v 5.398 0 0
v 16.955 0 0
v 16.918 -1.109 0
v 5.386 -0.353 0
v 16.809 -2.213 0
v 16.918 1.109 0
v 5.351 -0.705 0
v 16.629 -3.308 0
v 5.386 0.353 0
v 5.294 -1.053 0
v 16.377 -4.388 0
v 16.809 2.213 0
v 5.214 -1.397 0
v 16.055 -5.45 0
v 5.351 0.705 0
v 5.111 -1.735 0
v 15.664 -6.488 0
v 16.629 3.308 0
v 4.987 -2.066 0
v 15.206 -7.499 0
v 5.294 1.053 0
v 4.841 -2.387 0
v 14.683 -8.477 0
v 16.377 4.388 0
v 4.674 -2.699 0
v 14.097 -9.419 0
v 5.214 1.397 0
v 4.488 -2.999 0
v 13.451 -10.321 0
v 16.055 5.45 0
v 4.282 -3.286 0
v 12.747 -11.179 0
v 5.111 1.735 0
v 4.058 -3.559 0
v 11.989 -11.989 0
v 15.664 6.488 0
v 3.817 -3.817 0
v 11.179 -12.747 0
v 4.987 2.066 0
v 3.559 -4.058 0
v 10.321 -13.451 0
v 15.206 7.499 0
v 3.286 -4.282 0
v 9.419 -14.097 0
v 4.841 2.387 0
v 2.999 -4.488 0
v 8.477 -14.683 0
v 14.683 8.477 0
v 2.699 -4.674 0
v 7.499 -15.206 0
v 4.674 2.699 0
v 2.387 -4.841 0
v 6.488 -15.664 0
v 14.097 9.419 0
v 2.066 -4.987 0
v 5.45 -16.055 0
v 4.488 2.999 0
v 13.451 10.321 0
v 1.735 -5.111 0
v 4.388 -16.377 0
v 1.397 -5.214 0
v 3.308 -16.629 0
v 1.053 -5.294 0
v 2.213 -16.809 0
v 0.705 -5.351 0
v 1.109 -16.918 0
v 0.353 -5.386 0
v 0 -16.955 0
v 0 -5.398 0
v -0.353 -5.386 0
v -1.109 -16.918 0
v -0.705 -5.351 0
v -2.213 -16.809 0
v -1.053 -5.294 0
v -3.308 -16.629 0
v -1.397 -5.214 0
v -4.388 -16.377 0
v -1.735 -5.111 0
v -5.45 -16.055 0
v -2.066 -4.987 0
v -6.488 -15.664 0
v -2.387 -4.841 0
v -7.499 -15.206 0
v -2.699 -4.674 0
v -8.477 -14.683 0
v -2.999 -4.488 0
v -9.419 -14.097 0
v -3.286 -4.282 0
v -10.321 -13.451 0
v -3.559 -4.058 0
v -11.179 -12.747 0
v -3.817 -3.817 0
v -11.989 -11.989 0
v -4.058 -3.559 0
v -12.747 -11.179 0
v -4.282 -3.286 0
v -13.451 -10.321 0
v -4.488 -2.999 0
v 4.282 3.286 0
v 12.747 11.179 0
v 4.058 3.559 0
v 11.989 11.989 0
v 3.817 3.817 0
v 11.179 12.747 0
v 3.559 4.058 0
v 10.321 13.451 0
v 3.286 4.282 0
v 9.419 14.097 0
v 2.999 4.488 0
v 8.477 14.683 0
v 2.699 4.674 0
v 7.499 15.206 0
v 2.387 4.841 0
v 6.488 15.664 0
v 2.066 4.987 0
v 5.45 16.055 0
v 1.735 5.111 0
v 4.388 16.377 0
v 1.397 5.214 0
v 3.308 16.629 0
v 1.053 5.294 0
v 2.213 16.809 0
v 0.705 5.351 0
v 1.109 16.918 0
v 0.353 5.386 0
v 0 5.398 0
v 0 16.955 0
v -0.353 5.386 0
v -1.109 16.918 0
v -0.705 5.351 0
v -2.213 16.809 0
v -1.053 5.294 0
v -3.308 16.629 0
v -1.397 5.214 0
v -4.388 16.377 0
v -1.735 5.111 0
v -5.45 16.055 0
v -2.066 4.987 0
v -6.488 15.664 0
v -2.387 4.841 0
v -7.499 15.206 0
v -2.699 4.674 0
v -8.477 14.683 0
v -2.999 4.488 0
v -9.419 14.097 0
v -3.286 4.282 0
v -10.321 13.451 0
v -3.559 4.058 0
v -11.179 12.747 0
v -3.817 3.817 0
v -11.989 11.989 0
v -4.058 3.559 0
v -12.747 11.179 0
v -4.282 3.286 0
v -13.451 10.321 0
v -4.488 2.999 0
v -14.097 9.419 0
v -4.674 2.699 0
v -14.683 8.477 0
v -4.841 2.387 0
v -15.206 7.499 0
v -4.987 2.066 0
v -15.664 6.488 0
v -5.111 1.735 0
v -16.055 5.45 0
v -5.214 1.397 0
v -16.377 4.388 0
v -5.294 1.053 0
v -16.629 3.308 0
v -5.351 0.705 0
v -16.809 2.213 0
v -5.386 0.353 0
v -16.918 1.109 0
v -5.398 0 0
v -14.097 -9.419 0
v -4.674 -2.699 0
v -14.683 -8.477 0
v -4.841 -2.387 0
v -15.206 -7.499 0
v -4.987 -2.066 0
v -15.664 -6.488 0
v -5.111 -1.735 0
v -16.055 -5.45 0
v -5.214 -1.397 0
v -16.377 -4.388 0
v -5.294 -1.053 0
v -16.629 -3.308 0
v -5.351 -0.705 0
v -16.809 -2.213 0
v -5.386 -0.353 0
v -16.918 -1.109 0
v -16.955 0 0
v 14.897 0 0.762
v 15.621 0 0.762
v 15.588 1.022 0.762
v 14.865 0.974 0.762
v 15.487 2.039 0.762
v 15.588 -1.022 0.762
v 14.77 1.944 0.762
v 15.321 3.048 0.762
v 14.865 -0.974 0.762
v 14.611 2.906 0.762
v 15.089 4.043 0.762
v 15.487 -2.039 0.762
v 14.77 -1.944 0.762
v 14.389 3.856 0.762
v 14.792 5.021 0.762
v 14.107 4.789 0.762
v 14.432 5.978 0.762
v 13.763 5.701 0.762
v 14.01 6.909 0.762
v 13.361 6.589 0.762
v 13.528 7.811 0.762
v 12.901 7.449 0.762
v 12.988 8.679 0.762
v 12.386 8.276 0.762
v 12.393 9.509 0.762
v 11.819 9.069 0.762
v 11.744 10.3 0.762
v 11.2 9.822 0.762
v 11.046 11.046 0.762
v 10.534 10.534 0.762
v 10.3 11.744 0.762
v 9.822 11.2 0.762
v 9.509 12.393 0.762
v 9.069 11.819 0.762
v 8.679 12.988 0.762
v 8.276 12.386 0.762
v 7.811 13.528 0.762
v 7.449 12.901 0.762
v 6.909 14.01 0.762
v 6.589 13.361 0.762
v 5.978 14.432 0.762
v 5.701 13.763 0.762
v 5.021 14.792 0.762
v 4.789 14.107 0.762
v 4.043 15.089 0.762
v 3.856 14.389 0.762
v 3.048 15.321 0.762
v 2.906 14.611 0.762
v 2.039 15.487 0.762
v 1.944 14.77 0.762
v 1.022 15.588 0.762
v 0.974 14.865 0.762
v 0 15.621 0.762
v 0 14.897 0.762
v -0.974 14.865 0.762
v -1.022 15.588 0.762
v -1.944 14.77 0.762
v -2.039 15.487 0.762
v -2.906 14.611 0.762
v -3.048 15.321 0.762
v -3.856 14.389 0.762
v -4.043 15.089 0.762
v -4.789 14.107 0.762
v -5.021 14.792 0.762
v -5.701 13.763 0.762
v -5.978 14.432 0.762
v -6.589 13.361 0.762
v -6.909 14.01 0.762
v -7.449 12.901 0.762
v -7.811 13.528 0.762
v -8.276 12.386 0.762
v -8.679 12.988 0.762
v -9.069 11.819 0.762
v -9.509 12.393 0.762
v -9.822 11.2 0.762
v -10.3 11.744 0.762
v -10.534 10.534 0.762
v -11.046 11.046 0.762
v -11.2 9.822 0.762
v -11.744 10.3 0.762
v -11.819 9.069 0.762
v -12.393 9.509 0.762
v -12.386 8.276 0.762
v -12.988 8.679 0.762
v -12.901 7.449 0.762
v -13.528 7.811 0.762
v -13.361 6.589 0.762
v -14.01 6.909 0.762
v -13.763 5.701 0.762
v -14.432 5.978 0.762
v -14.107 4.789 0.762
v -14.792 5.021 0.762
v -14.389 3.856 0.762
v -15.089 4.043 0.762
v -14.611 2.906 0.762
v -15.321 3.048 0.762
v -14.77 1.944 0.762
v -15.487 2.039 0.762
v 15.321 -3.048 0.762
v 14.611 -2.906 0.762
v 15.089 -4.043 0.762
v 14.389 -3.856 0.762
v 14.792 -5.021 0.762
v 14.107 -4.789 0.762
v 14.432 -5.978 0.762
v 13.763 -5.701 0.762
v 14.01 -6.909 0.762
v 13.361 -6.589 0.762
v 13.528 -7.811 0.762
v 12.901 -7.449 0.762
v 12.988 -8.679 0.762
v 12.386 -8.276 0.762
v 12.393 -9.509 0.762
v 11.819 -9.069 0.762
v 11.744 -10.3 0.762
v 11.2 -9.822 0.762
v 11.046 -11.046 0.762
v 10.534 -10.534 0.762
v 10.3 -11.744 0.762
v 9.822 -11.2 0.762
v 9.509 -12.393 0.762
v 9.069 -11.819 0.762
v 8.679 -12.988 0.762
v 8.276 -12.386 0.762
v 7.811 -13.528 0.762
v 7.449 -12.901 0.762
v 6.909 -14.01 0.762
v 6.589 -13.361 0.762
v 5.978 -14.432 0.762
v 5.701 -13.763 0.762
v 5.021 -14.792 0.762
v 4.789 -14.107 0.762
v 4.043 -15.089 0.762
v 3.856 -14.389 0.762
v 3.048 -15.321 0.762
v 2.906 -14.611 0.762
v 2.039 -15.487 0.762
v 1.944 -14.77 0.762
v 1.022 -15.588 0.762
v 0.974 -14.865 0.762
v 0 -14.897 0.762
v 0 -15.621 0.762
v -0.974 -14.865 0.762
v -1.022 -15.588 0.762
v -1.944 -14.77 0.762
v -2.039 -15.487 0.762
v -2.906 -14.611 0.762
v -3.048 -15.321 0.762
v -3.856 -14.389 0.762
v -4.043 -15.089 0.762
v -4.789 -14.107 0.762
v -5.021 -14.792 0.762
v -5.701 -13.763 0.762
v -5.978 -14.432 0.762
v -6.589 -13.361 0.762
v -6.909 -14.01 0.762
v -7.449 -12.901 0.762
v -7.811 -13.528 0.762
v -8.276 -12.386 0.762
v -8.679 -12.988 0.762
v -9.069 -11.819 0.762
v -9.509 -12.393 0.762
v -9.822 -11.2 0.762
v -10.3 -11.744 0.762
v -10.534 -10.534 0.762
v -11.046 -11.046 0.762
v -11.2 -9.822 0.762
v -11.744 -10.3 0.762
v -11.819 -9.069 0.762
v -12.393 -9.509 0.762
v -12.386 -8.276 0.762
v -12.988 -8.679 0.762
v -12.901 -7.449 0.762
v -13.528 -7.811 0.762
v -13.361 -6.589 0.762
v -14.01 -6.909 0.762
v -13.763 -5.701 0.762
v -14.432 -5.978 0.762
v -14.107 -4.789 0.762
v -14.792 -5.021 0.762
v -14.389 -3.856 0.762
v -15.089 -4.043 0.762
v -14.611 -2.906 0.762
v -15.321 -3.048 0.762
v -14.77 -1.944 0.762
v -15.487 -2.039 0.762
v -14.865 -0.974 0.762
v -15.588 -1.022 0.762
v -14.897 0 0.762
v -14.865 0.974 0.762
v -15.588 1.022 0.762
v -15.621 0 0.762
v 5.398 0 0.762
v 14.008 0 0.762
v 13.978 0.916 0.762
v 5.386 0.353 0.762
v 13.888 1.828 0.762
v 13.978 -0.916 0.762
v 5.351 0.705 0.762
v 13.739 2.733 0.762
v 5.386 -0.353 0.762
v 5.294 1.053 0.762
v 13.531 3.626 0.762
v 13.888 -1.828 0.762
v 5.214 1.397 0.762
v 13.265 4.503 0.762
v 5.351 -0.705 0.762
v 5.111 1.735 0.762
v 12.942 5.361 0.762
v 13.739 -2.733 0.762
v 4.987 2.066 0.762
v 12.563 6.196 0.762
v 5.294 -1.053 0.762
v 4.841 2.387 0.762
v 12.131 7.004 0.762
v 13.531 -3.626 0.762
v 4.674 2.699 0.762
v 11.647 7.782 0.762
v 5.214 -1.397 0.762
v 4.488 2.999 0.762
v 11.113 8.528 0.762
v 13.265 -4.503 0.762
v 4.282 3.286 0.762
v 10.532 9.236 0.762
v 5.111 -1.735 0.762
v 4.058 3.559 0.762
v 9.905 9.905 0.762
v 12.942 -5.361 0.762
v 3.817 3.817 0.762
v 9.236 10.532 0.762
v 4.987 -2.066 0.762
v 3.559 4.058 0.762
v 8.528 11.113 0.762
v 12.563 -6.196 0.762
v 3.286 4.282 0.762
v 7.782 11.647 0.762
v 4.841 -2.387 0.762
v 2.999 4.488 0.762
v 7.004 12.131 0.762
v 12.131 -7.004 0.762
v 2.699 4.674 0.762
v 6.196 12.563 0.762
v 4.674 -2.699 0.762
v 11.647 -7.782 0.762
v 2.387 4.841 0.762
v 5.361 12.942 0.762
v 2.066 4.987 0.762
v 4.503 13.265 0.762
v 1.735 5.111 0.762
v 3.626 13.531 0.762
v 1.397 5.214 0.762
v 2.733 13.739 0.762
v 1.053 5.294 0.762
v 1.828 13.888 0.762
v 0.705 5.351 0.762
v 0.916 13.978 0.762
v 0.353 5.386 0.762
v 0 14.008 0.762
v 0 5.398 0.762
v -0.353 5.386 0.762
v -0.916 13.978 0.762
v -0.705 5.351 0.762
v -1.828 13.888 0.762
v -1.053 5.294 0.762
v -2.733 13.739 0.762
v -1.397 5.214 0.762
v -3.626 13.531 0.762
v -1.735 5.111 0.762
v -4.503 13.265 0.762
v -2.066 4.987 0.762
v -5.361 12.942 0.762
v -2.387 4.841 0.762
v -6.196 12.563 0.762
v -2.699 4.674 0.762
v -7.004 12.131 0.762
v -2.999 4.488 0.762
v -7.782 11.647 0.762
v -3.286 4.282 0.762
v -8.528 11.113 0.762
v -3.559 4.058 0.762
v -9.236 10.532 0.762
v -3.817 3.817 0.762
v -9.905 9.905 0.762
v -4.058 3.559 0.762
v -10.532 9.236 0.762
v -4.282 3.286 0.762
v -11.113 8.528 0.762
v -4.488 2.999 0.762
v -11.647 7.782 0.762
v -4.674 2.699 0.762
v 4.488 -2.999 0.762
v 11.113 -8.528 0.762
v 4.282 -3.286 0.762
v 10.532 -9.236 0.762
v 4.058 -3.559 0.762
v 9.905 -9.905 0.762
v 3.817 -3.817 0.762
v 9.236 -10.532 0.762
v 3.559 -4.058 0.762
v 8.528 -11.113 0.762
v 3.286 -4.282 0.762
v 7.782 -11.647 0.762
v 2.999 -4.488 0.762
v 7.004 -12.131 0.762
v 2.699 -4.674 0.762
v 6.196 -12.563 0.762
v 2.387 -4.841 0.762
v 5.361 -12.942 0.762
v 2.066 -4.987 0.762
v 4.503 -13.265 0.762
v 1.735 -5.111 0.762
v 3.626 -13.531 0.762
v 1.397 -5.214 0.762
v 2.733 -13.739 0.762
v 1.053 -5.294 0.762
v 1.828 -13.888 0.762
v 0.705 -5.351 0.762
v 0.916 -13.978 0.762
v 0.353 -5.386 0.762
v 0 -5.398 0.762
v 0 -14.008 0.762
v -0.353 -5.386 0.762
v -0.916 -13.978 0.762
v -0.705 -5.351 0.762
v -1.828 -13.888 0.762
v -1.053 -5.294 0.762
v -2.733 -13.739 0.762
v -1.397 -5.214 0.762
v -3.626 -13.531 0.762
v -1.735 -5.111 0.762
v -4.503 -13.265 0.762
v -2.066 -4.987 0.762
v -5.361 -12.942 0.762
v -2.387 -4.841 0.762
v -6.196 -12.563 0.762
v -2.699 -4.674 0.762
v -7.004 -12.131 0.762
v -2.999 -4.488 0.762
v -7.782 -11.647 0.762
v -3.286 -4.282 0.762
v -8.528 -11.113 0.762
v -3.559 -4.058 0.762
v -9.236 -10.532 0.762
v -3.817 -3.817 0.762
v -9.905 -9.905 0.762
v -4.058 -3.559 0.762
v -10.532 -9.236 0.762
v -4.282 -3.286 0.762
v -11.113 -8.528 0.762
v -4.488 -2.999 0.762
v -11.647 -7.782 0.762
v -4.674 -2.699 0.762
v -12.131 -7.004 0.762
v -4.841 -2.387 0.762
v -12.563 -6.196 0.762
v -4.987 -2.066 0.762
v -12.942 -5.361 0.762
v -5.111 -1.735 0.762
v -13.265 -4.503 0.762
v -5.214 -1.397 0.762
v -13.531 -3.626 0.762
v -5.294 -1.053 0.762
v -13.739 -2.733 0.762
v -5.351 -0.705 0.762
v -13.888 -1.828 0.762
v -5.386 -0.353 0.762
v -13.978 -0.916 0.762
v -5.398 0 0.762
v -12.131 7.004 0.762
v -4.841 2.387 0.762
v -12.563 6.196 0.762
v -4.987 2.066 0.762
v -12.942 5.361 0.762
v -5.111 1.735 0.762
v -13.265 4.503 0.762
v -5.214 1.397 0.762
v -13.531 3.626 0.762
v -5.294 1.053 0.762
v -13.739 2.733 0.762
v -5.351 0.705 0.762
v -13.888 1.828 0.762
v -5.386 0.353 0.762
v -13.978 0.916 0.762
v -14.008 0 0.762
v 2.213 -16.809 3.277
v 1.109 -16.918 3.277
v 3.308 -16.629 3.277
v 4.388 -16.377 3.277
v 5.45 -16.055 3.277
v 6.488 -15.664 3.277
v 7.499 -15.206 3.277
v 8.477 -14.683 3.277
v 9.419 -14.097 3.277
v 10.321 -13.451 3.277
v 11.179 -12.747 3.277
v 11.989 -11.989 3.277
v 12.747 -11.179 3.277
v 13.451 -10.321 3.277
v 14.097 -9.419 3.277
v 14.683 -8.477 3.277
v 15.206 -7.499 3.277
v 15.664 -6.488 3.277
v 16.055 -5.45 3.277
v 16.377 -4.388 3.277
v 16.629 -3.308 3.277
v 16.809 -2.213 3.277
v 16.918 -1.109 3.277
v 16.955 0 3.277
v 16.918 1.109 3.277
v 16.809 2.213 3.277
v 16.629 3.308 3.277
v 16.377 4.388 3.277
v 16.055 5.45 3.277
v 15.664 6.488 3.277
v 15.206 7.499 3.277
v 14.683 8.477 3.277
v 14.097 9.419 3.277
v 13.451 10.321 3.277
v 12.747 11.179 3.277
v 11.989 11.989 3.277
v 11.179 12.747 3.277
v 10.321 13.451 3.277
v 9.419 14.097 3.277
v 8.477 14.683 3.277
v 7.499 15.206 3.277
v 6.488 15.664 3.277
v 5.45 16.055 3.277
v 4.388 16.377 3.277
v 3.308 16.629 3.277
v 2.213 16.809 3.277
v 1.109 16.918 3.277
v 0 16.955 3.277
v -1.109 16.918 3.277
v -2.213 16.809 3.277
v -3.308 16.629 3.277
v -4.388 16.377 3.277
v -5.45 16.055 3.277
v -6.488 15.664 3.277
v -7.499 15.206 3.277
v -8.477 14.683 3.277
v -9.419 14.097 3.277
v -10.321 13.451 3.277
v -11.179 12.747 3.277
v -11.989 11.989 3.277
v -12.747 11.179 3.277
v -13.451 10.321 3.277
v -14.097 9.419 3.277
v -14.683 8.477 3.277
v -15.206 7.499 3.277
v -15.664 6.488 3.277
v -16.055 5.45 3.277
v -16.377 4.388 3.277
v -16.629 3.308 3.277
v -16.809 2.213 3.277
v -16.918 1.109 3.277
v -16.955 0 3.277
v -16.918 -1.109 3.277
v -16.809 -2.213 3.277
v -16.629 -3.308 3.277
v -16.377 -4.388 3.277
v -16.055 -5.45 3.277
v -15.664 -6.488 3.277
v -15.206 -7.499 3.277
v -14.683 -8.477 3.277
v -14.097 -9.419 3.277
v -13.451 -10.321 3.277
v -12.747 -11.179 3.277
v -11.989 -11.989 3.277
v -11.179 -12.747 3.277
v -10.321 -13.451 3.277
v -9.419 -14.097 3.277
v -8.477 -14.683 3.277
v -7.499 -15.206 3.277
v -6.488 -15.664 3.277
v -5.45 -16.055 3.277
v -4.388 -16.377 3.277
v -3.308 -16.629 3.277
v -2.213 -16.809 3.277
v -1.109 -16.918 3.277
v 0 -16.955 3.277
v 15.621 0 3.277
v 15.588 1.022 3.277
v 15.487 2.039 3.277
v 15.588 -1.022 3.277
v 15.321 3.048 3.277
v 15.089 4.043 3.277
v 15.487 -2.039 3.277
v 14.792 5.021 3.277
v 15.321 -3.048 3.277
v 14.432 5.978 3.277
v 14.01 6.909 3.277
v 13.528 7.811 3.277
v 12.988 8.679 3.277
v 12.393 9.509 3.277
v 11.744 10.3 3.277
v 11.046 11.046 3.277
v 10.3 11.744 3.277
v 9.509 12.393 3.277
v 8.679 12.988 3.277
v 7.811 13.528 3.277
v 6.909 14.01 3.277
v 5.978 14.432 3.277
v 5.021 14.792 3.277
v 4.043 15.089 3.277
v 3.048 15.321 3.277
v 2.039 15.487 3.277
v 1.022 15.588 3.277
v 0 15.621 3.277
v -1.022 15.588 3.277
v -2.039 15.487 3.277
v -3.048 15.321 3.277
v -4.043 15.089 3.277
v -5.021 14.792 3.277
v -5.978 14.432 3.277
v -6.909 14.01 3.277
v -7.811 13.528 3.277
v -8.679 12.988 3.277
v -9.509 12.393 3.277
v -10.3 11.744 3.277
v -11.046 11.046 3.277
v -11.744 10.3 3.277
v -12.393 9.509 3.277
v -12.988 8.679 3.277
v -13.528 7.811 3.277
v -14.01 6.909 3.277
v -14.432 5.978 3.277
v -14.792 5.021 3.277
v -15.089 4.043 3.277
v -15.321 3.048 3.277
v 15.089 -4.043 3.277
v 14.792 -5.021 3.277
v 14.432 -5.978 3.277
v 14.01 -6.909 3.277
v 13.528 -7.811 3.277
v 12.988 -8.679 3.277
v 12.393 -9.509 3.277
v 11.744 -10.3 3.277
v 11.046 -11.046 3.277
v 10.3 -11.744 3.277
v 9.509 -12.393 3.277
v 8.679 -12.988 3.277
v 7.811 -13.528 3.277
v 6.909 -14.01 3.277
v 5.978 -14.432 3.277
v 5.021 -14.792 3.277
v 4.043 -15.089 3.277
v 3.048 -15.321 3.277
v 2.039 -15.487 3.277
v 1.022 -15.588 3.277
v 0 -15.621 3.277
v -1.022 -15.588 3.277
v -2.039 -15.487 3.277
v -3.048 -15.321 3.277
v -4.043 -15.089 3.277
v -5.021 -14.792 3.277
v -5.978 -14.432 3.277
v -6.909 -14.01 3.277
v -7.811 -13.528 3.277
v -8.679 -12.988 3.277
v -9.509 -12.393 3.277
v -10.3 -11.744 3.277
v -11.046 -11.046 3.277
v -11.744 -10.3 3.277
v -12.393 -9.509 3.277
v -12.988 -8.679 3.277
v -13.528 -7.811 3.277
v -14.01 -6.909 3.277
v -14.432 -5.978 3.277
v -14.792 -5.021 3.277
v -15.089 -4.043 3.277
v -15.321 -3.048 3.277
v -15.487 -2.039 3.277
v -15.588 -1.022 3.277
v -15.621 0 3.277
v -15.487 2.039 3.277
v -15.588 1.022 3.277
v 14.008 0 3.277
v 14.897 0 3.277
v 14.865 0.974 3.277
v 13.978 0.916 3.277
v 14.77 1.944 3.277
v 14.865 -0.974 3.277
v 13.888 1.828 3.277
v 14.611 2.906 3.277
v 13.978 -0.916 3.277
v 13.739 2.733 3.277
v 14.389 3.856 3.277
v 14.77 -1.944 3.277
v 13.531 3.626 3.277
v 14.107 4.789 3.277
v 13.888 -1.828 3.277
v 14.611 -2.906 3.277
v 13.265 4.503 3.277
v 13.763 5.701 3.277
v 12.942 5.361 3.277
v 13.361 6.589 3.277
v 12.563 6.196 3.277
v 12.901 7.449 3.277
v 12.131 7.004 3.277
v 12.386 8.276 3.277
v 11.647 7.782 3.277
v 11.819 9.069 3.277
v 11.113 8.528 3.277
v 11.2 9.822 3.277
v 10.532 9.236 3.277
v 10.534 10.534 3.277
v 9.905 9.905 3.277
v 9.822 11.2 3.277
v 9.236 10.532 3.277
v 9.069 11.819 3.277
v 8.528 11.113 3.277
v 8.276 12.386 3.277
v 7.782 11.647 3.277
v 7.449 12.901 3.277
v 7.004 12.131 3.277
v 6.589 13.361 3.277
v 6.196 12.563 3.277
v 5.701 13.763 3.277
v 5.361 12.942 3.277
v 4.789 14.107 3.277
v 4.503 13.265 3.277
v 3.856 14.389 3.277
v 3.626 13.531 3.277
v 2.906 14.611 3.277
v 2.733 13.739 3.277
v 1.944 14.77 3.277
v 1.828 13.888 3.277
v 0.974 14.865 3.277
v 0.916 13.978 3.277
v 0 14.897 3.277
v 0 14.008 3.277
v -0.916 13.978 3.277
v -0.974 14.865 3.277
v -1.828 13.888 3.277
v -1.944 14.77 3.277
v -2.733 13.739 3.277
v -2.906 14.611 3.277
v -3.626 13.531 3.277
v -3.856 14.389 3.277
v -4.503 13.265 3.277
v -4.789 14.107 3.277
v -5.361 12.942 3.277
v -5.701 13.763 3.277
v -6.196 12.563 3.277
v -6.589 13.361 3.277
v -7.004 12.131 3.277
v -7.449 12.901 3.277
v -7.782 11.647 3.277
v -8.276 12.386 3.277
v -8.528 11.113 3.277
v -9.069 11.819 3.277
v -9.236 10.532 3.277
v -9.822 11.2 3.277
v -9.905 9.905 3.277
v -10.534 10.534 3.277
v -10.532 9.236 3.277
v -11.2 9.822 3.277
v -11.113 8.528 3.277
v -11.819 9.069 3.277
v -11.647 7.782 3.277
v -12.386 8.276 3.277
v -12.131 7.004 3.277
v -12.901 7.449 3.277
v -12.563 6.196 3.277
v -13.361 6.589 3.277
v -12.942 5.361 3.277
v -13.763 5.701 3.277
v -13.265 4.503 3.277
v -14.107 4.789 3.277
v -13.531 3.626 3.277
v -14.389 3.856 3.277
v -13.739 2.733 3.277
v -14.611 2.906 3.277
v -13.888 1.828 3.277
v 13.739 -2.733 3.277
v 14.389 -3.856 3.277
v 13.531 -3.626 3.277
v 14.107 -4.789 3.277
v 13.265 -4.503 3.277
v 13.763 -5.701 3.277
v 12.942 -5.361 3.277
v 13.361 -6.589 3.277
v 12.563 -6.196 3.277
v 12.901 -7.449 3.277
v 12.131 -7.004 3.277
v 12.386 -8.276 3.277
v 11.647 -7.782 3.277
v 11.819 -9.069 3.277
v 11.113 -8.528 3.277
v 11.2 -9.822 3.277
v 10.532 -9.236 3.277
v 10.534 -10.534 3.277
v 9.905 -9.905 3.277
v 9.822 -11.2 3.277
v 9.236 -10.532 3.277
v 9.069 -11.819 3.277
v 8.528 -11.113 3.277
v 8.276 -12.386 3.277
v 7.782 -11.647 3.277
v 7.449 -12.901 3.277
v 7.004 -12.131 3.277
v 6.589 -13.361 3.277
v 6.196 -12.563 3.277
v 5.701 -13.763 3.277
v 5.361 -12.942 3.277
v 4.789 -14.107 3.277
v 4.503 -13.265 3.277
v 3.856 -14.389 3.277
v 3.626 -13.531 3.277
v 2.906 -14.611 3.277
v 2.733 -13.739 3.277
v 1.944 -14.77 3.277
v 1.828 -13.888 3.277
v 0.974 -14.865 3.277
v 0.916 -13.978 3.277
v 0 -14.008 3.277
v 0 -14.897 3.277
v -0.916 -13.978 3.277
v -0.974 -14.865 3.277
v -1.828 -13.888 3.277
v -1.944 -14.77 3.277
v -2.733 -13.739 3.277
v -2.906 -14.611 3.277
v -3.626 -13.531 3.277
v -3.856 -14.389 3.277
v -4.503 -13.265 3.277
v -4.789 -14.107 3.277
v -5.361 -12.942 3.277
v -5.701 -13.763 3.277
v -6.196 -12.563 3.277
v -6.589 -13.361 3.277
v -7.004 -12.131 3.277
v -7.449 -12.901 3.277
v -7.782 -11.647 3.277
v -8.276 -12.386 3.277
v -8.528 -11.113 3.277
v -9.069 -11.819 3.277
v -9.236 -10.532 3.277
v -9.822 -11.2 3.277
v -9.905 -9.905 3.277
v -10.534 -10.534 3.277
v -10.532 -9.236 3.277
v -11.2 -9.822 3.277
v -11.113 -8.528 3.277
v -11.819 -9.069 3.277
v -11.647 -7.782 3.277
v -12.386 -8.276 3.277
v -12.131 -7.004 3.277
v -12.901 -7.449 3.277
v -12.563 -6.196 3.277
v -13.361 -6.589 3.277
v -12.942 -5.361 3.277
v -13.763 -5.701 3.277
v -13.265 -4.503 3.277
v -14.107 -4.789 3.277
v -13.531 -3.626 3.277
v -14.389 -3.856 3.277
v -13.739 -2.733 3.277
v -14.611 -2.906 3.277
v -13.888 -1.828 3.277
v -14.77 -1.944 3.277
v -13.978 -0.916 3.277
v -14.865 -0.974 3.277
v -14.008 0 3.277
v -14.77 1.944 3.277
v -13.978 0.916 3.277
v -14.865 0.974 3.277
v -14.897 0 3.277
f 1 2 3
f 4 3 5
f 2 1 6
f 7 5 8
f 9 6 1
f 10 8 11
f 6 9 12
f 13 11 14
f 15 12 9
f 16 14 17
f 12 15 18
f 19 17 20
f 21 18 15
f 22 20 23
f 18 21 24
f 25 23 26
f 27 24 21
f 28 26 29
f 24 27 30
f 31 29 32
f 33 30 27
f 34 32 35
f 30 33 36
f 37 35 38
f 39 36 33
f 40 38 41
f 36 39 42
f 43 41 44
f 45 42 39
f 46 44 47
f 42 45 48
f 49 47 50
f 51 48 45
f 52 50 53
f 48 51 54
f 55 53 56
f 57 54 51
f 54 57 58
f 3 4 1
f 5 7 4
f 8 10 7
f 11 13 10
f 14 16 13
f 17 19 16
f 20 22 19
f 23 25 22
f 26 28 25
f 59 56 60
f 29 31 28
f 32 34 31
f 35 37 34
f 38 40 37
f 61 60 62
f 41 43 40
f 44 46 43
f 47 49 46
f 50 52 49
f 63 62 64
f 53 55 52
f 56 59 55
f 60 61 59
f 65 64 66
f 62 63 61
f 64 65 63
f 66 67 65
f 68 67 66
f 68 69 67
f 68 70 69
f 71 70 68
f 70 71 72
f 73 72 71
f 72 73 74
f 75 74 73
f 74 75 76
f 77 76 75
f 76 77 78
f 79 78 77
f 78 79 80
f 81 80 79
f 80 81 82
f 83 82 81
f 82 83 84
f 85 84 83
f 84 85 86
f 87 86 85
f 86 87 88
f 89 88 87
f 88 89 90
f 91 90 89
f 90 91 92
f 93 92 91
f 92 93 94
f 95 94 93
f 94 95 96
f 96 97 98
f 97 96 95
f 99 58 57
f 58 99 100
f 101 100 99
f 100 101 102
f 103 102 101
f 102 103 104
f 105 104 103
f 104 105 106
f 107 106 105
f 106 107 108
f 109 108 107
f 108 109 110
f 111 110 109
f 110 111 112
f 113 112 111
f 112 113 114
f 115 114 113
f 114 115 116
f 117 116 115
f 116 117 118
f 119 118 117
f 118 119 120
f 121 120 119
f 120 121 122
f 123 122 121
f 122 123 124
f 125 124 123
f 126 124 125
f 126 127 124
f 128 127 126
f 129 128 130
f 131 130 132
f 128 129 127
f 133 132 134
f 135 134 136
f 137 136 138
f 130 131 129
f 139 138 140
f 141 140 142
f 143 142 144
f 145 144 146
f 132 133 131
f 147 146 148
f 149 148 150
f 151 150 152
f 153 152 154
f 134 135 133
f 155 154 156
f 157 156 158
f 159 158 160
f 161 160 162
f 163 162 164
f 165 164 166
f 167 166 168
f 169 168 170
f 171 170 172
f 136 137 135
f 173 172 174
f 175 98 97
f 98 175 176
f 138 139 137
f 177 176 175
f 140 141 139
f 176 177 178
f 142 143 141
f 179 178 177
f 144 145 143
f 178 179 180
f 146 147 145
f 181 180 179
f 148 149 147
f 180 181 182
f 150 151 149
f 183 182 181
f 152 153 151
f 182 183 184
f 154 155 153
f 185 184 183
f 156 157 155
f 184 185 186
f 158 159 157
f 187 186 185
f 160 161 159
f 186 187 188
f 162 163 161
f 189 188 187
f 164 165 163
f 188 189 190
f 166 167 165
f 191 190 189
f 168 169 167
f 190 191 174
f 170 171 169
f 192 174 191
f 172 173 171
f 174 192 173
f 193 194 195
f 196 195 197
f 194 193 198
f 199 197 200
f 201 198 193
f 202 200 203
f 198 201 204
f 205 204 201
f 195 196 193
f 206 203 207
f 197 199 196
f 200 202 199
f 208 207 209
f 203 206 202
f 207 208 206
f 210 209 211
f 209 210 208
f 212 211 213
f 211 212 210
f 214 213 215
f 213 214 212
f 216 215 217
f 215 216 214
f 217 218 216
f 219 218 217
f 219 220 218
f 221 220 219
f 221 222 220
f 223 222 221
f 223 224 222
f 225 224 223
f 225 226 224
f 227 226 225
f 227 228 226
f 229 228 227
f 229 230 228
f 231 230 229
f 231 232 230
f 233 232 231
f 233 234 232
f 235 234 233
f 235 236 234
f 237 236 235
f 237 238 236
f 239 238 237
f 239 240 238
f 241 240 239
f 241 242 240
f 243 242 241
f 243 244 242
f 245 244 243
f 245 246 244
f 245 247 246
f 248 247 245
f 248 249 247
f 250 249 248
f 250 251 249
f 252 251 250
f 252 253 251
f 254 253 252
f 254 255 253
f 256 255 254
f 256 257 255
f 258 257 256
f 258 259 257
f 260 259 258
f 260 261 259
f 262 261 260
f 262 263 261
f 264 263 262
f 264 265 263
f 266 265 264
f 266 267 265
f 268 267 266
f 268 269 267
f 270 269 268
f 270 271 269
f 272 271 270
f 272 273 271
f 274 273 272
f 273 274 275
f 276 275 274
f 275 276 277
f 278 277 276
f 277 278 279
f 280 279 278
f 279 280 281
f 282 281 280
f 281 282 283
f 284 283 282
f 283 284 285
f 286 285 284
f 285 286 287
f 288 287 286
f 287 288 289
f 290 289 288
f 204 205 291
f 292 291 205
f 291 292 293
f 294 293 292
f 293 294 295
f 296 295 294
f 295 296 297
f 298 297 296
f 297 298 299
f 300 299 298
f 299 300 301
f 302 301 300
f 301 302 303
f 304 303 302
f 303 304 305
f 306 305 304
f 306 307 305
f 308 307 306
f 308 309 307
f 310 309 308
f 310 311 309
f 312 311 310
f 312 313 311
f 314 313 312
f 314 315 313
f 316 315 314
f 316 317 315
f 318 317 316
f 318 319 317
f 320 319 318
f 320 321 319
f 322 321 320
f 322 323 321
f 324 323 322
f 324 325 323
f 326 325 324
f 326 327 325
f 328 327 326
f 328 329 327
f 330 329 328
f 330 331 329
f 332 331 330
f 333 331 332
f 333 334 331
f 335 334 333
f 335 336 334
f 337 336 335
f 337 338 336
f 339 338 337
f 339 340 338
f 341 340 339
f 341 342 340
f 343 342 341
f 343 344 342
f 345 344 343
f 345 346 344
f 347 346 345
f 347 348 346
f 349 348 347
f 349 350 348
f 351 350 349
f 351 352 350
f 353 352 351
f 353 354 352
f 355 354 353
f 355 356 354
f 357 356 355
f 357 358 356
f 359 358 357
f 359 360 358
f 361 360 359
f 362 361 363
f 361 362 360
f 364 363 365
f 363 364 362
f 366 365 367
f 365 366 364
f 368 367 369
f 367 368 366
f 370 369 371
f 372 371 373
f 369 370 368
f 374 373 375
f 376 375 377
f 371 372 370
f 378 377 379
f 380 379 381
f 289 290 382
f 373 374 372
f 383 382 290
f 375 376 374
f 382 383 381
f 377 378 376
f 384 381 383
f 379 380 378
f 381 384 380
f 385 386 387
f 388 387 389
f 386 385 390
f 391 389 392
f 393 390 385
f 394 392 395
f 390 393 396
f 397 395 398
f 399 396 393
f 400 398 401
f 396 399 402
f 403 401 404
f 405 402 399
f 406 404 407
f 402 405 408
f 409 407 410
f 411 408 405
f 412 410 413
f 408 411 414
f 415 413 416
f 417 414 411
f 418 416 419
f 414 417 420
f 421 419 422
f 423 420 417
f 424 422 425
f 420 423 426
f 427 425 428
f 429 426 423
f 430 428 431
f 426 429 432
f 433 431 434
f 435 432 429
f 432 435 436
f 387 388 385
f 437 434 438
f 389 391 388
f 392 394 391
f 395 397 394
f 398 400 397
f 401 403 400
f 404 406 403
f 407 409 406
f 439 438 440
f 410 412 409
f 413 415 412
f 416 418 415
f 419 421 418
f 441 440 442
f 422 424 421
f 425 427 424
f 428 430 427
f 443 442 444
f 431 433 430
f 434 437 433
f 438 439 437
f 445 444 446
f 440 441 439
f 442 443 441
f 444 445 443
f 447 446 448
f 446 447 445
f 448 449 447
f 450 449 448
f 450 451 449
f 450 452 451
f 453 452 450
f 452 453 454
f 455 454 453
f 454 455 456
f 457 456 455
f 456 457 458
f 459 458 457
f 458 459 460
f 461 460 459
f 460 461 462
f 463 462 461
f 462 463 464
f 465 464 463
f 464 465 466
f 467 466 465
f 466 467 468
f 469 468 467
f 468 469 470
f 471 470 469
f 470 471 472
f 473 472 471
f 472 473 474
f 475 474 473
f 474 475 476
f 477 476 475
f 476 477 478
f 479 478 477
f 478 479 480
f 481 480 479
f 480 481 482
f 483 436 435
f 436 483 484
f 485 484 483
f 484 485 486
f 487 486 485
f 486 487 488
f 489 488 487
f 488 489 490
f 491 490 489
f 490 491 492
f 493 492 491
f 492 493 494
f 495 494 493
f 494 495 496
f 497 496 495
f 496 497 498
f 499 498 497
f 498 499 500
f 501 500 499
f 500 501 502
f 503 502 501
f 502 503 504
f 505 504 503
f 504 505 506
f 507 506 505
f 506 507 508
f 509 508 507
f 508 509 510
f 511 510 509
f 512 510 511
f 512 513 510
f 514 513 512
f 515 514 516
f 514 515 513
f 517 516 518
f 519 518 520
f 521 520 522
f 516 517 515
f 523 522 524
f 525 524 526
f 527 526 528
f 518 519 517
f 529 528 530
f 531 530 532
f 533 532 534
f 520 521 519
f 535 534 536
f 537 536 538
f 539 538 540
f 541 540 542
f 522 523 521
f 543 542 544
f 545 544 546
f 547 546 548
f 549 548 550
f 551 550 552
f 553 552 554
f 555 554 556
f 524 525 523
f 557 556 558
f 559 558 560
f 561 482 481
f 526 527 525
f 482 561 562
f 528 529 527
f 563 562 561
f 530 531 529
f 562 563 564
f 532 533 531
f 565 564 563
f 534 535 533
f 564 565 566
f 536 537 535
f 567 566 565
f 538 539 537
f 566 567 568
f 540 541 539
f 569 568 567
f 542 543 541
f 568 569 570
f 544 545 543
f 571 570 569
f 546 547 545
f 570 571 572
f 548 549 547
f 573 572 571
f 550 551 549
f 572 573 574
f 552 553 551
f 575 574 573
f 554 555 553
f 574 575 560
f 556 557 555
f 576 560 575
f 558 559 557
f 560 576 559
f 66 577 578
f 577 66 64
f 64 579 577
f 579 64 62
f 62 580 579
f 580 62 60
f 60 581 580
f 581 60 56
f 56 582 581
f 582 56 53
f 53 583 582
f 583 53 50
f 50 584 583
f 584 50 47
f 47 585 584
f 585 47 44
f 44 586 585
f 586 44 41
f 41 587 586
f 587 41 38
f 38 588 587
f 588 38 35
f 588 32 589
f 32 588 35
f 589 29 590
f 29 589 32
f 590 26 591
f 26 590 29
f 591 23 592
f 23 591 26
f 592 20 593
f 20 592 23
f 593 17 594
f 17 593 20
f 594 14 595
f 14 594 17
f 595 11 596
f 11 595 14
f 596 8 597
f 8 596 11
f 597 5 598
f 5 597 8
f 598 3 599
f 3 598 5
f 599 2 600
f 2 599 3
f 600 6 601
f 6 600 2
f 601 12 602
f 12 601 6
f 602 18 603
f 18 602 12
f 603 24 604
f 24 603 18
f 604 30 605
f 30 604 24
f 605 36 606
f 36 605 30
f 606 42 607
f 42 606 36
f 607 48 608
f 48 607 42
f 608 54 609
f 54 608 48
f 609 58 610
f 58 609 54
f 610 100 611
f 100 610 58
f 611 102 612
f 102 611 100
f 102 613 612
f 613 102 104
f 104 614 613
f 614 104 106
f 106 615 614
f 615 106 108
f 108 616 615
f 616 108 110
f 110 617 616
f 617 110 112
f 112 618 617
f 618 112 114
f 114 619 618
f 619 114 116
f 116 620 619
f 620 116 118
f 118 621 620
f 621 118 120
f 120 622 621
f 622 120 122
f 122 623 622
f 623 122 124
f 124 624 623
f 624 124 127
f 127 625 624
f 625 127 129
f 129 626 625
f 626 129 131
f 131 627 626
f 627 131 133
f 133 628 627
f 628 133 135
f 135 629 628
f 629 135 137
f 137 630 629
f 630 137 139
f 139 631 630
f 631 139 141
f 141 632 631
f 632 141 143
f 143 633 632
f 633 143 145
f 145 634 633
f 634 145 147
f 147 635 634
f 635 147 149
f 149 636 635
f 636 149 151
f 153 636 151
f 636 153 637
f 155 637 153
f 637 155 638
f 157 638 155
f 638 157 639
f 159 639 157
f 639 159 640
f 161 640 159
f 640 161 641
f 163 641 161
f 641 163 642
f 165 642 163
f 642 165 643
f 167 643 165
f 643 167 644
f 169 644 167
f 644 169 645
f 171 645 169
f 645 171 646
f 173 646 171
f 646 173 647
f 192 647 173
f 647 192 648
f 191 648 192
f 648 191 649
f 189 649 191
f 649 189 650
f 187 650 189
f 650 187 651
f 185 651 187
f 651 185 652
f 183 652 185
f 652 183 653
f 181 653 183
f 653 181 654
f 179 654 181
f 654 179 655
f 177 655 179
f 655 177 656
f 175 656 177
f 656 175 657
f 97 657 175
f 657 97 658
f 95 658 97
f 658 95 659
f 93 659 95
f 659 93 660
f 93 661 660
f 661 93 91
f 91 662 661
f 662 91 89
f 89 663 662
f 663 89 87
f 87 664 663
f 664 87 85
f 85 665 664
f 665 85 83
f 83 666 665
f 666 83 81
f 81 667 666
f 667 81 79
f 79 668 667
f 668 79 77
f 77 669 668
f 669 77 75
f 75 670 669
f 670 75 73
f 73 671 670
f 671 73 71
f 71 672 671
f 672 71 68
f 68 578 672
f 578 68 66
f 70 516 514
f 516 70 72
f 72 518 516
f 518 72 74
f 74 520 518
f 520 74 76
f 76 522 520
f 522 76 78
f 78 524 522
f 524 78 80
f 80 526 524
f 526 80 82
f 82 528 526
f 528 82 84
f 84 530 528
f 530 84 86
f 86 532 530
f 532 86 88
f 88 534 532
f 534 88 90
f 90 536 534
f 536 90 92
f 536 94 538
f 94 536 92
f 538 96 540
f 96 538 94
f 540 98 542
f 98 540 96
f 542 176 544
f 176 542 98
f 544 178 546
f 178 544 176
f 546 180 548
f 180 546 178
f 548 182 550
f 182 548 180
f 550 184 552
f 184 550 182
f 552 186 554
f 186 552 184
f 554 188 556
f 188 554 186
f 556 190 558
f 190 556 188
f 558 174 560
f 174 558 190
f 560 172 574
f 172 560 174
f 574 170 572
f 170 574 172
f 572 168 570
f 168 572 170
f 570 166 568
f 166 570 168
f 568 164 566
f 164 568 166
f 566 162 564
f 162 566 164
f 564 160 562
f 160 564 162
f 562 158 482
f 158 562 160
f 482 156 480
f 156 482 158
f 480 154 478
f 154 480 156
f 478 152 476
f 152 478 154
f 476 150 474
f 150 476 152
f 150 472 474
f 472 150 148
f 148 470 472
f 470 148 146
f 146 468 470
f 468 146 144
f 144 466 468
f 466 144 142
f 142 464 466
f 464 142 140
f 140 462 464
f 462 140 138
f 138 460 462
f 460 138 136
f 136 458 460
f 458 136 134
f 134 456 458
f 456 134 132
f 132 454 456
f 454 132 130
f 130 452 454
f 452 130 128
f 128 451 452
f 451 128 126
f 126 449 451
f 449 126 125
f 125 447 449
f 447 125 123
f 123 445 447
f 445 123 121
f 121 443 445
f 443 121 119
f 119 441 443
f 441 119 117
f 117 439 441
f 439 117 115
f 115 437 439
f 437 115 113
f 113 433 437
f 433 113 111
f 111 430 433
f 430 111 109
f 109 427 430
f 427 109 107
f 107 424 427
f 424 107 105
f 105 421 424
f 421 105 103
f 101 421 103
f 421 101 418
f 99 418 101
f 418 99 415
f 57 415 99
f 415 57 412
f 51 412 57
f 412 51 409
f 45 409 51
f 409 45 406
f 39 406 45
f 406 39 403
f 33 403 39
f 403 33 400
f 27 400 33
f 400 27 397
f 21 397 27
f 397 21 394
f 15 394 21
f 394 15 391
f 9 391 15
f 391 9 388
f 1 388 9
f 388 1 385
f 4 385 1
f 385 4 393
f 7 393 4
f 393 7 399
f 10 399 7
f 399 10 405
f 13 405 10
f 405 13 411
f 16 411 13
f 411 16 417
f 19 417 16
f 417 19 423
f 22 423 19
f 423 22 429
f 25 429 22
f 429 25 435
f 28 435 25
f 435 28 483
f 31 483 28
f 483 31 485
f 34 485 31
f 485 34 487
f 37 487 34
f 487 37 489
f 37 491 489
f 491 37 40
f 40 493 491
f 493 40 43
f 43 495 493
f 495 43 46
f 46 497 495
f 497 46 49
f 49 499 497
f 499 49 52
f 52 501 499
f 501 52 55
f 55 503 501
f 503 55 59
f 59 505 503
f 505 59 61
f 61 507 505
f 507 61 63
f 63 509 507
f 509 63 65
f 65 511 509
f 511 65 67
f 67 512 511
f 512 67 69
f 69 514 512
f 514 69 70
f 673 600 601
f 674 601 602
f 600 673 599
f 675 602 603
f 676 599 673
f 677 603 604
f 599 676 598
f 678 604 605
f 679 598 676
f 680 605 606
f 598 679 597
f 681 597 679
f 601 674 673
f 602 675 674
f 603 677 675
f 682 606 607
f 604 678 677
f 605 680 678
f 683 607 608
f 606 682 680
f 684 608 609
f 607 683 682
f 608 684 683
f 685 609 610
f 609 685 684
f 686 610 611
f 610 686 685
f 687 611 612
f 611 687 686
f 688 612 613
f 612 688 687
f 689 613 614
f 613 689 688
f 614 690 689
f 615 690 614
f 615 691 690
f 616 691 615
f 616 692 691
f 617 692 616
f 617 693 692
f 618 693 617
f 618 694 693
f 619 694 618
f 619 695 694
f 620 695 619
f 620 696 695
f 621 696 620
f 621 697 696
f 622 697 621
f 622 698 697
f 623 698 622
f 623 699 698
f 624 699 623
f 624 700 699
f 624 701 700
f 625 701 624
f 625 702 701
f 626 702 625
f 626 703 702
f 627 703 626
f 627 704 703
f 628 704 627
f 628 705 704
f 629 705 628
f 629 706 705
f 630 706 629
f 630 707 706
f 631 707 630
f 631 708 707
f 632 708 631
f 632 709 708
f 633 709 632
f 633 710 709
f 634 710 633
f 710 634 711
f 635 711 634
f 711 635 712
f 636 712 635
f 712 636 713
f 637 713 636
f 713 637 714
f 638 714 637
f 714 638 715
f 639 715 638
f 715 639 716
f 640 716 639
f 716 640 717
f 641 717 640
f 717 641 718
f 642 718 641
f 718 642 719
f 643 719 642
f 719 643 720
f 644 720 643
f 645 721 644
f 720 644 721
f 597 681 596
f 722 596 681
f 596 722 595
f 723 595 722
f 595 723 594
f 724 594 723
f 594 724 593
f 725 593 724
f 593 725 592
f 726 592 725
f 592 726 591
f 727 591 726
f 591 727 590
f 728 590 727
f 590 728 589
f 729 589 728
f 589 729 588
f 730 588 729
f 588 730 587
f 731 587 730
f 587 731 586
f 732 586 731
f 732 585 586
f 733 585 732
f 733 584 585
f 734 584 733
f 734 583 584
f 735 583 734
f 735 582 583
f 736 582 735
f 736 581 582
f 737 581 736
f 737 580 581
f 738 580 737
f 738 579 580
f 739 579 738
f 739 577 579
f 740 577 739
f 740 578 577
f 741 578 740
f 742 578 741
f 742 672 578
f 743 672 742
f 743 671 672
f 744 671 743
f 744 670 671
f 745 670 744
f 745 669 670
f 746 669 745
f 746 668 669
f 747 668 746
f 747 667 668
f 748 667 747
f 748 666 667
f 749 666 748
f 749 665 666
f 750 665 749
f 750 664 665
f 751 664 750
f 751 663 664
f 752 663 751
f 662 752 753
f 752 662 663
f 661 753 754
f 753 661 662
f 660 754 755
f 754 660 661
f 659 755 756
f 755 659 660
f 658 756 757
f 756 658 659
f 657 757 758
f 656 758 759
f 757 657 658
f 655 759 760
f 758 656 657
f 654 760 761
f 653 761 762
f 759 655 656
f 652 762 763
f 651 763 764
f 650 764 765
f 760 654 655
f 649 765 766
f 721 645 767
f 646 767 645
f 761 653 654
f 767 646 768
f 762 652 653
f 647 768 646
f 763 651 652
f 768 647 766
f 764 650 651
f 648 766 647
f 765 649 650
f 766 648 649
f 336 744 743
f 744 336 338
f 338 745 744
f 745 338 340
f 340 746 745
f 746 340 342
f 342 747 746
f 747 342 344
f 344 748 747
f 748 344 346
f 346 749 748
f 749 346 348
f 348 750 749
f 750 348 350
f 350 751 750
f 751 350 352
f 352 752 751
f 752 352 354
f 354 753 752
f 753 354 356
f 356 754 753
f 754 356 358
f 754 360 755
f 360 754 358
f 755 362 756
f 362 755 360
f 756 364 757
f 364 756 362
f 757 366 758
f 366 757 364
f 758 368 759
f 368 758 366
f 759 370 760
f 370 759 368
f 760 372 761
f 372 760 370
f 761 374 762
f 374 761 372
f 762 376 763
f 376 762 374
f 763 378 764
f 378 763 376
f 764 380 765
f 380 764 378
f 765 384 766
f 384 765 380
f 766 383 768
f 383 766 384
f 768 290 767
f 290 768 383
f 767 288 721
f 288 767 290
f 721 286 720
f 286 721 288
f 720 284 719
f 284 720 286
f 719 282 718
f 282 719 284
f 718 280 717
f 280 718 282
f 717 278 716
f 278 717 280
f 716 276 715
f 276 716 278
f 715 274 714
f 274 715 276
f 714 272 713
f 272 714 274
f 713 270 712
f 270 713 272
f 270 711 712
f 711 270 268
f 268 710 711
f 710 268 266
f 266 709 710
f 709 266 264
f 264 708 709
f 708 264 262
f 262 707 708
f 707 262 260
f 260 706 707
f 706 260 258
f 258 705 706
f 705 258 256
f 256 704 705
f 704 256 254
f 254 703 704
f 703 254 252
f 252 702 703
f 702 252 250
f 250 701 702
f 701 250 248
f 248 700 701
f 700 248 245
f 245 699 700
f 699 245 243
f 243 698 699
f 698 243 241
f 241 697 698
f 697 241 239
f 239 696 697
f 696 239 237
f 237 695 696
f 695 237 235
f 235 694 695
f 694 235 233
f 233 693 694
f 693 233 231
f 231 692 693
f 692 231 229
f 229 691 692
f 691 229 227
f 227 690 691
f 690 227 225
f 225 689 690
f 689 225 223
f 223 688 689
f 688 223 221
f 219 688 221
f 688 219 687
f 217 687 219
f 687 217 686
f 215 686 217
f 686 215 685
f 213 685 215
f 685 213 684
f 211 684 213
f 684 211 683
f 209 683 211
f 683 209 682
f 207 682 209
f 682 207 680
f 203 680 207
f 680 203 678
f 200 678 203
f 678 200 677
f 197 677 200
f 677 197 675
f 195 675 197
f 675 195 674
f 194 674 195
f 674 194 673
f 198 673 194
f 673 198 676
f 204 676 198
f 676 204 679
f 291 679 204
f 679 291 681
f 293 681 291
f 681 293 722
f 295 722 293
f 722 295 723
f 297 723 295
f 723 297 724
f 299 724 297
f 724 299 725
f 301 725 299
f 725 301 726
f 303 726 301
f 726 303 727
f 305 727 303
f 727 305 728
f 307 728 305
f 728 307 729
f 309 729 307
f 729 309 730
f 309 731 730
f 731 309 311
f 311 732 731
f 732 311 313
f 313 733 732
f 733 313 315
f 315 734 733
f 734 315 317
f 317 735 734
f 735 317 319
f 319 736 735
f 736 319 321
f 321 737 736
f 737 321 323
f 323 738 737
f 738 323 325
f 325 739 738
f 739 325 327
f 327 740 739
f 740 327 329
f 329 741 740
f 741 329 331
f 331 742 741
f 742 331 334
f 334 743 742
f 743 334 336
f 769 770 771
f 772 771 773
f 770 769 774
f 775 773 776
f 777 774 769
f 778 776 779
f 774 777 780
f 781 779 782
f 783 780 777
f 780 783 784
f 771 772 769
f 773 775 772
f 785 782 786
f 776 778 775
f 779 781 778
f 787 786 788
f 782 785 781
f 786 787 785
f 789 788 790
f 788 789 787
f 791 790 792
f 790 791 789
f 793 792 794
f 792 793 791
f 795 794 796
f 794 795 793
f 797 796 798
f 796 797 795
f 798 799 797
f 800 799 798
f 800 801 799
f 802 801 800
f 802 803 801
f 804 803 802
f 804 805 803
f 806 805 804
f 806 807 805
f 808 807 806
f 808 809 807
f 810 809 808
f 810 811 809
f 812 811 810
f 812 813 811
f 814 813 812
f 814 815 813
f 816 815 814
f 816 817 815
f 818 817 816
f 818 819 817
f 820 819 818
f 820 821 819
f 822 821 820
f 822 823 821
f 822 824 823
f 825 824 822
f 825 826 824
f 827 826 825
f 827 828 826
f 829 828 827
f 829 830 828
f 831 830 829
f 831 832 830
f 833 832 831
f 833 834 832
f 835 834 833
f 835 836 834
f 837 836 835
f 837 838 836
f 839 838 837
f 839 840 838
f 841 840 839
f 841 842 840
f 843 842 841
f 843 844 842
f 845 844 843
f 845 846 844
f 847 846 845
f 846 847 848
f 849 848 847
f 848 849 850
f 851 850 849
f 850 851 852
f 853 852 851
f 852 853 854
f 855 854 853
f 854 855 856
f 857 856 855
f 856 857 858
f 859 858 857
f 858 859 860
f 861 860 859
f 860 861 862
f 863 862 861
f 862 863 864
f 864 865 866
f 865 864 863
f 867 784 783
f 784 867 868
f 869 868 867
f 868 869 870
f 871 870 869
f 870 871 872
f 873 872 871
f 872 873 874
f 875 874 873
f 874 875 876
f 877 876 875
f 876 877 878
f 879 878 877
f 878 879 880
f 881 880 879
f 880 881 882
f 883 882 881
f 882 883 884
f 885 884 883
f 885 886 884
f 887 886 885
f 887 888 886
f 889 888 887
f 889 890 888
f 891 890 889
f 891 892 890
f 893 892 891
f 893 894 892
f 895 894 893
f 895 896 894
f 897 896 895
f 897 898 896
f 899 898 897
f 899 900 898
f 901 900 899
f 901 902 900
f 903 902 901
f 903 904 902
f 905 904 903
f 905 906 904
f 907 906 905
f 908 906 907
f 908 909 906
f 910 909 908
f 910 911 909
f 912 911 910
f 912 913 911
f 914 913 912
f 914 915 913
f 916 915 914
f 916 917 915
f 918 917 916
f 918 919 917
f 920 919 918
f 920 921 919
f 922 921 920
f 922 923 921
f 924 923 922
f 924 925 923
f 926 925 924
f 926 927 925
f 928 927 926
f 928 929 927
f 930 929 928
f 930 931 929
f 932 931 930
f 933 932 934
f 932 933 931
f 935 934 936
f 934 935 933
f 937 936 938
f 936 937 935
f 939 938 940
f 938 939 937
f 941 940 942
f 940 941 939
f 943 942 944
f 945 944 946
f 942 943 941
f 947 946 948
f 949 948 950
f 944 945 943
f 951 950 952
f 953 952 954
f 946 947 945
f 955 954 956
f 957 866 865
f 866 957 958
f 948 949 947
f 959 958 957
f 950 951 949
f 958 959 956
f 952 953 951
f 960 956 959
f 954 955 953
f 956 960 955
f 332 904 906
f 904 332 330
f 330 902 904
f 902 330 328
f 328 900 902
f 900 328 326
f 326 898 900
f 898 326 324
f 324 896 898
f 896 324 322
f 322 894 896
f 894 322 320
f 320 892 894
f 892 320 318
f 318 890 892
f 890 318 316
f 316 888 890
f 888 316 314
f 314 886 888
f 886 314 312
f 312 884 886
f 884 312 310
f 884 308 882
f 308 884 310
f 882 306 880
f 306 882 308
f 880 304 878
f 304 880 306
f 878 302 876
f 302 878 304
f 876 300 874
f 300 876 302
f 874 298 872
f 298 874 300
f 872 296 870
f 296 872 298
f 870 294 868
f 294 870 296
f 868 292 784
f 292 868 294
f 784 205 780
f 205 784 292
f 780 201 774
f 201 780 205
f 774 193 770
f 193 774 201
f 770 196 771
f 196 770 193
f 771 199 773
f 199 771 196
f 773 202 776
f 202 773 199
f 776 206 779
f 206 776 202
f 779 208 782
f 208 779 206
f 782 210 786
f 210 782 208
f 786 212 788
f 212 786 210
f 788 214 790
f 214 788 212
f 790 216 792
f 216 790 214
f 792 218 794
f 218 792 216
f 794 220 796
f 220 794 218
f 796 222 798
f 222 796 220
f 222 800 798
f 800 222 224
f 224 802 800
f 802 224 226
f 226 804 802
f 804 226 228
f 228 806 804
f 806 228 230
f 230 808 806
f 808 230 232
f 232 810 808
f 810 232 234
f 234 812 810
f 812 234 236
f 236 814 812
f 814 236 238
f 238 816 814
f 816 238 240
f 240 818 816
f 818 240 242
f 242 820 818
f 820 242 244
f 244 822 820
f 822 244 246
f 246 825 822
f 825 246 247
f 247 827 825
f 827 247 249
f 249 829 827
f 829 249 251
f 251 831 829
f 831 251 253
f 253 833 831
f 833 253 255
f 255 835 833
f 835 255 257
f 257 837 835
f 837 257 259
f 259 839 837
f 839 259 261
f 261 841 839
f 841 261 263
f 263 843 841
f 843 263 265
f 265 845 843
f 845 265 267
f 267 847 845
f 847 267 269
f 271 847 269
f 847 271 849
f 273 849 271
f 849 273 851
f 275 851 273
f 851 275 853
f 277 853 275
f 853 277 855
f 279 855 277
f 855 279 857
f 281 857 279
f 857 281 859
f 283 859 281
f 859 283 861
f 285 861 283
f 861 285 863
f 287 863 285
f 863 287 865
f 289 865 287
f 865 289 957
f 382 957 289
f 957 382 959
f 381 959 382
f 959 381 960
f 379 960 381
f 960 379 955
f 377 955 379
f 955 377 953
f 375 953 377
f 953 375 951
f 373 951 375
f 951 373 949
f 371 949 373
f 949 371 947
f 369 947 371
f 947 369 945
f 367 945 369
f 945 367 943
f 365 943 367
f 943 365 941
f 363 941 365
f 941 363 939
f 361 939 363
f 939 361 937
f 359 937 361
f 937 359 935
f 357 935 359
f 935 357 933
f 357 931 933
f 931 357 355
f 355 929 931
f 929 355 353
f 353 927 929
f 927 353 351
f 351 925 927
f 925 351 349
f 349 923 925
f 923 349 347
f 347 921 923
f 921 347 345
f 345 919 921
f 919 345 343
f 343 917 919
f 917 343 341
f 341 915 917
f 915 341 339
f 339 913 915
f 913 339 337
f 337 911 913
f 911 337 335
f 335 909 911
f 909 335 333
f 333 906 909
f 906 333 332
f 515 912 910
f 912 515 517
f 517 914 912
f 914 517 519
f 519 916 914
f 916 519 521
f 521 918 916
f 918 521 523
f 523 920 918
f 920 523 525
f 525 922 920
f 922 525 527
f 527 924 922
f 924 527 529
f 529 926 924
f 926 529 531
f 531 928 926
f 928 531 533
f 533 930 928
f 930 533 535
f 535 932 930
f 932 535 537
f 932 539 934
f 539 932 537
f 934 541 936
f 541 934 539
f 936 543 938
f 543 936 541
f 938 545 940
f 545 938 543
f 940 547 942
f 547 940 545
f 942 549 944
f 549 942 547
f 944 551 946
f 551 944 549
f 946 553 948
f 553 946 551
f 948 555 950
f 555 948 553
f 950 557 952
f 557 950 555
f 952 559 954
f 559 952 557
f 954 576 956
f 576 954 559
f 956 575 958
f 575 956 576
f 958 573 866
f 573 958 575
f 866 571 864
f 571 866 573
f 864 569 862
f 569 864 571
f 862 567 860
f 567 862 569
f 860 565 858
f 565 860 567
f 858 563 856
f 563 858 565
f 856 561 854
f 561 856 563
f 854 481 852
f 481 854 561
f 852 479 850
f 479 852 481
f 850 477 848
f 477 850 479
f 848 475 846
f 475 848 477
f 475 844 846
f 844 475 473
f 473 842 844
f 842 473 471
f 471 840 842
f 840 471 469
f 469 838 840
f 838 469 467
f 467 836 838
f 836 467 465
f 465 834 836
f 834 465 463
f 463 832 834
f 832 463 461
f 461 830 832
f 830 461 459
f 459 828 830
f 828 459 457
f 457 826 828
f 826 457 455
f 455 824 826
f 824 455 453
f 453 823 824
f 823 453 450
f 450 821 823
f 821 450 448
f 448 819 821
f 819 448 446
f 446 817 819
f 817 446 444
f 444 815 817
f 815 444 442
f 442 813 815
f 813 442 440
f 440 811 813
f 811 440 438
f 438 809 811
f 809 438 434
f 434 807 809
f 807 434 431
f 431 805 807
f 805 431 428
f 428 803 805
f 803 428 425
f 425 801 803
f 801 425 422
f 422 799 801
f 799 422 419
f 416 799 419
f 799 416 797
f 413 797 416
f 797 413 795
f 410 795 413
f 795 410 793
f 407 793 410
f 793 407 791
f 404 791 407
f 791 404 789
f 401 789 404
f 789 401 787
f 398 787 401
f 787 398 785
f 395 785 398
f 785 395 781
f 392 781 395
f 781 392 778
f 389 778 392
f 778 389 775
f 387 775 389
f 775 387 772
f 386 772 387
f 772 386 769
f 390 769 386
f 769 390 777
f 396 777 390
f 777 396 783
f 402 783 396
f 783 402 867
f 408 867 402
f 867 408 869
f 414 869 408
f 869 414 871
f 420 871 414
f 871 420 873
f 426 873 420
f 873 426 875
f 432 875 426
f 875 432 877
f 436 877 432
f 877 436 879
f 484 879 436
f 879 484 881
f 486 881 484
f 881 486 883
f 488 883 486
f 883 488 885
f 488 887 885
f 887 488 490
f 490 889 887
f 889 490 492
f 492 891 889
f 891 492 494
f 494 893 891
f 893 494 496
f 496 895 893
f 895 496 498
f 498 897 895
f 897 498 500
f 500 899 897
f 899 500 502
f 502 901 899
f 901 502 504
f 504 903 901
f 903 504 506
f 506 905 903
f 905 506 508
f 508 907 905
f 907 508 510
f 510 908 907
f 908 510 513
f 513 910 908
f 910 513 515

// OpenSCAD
ViewScale = [0.0254, 0.0254, 0.0254];
lensR = 1083/2;

module barrel()
{
    difference() {
        circle(1335/2, $fn=96);
        circle(1230/2, $fn=96);
    }
}

module mask()
{
    difference() {
        circle(1335/2, $fn=96);
        circle(425/2, $fn=96);
    }
}

module lensmount()
{
    difference() {
        circle(lensR+45, $fn=96);
        circle(lensR+10, $fn=96);
    }
}

scale(ViewScale)
{
    linear_extrude(30)
    mask();
    translate([0, 0, 29])
    linear_extrude(100)
    barrel();
    translate([0, 0, 29])
    linear_extrude(100)
    lensmount();
}
